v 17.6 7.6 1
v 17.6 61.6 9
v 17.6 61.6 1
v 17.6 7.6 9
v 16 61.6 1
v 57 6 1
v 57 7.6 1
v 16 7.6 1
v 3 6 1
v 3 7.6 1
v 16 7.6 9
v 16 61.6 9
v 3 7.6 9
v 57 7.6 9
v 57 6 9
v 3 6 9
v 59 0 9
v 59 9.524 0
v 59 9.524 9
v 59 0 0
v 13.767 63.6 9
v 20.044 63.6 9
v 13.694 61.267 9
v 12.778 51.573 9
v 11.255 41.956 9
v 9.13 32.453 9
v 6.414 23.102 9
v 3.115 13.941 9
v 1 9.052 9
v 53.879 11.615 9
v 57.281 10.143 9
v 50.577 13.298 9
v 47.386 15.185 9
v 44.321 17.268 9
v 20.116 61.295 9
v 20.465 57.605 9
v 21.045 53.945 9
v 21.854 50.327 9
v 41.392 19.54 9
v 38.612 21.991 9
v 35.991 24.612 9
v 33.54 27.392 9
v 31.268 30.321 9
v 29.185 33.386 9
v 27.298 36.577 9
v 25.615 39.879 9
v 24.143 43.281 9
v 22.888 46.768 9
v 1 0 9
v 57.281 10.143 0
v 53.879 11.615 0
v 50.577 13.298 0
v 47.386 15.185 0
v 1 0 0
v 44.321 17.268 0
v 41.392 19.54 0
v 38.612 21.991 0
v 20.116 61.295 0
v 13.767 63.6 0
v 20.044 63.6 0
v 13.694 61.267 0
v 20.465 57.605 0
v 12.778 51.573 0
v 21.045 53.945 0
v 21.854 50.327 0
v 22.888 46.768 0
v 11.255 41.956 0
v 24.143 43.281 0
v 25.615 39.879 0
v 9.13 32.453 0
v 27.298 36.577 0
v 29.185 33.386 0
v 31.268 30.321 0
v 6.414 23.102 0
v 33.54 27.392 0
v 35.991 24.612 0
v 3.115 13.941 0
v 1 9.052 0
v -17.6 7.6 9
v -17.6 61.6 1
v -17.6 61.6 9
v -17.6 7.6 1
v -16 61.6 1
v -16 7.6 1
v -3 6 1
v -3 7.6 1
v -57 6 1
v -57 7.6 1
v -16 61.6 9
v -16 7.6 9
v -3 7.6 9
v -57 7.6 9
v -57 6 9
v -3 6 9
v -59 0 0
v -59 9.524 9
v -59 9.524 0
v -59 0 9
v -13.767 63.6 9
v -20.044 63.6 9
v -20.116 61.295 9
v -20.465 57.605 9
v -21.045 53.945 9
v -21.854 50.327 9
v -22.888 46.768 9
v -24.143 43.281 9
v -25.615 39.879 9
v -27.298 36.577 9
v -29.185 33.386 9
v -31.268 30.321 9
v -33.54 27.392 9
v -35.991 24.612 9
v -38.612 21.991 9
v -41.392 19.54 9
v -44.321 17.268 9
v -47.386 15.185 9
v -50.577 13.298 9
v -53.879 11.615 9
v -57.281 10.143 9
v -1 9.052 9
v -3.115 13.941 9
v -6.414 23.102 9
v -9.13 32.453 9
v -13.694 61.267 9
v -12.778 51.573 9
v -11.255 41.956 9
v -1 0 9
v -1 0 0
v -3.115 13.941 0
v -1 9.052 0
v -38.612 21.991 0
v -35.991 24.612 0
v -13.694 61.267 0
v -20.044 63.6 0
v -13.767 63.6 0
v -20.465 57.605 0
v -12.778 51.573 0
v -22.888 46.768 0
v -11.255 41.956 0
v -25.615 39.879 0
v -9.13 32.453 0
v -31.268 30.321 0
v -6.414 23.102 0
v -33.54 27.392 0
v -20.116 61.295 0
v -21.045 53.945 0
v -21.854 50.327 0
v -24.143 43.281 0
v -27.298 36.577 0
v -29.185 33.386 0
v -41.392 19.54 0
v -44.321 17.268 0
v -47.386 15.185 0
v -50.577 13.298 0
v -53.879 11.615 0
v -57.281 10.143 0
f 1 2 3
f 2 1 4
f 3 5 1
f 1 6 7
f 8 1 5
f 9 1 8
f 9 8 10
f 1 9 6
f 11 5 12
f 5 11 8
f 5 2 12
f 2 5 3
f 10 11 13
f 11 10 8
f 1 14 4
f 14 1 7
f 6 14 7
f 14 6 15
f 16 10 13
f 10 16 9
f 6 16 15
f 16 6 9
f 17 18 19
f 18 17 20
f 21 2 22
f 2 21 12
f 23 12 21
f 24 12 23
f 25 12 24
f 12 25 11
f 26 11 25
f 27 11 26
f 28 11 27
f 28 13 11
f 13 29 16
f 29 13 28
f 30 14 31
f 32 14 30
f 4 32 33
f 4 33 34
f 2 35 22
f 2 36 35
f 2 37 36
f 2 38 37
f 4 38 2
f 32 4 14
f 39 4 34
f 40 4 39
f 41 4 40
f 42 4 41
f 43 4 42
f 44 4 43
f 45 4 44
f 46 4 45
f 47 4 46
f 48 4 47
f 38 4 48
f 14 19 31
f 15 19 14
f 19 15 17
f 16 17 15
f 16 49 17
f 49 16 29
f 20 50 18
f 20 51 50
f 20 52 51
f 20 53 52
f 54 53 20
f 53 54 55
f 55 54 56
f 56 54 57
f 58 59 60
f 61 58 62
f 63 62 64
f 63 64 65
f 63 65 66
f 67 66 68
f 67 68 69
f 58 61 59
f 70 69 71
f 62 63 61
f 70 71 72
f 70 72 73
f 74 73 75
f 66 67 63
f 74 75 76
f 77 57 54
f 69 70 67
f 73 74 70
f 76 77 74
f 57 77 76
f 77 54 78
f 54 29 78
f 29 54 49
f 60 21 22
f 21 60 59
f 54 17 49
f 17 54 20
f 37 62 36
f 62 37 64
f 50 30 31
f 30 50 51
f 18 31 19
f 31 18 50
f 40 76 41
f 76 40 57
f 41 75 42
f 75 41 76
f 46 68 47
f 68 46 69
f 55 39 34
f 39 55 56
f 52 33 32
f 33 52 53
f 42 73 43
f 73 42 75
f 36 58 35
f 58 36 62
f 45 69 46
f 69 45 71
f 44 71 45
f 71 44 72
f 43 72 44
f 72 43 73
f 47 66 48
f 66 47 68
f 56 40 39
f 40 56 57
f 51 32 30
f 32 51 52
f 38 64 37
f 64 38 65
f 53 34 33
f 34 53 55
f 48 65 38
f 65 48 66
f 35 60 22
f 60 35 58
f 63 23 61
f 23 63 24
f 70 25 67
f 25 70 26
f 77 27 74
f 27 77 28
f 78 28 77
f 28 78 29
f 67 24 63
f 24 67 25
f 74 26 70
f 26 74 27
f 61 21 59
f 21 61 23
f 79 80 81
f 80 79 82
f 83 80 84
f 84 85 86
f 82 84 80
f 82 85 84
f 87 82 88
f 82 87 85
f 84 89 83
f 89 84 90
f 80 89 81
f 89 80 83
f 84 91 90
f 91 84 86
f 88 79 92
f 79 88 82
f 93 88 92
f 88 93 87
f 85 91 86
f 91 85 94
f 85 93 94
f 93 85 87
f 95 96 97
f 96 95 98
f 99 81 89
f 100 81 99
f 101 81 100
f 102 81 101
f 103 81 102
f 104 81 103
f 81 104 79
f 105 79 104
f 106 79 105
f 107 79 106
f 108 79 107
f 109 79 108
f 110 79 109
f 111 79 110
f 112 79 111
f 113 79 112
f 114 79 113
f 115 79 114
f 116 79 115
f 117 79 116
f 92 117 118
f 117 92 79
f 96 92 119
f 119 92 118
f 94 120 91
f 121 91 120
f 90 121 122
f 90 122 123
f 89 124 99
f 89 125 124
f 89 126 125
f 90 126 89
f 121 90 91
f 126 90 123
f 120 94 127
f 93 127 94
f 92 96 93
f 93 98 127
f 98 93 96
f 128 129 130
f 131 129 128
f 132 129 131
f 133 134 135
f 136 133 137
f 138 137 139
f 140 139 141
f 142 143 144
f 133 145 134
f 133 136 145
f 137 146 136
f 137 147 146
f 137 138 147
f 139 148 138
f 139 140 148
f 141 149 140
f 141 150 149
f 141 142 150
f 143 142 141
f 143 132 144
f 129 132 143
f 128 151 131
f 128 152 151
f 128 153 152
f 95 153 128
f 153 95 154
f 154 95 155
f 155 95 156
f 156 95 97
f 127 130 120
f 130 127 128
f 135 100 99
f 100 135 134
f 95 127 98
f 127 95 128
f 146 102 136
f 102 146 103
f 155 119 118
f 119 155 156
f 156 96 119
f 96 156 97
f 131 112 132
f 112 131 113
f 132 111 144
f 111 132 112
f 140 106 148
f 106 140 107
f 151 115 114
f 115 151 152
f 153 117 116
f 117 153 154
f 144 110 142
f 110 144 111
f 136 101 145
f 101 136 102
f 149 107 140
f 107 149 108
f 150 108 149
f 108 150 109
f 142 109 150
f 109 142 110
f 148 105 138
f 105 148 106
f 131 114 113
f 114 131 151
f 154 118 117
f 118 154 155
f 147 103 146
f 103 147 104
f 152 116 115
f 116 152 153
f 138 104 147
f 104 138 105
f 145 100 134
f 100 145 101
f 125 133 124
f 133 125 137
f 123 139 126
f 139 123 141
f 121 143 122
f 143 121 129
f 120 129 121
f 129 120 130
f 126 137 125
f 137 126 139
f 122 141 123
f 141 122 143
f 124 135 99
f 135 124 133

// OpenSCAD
PCB_THICKNESS = 1.6;
EDGE_LENGTH = 54;
WRAPAROUND = 2;

module thingie() {
  translate([1, 0, 0]) {
    difference() {
      cube([
        EDGE_LENGTH + 2 * WRAPAROUND,
        EDGE_LENGTH + 2 * WRAPAROUND*2 + PCB_THICKNESS,
        9]);
      translate([EDGE_LENGTH+17+5+2, EDGE_LENGTH+5+6]) {
        cylinder(10, EDGE_LENGTH+5, EDGE_LENGTH+5, $fn=100);
      };

      translate([-142,71]) {
        cylinder(10, 155, 155, $fn=100);
      };


      translate([WRAPAROUND, WRAPAROUND*3,1])  {
        translate([13, PCB_THICKNESS,0])  {
          cube([PCB_THICKNESS,EDGE_LENGTH,20]);
        }
        cube([EDGE_LENGTH,PCB_THICKNESS,20]);
      }
    }
  }
}

thingie();
mirror([1,0,0]) {
  thingie();
}
